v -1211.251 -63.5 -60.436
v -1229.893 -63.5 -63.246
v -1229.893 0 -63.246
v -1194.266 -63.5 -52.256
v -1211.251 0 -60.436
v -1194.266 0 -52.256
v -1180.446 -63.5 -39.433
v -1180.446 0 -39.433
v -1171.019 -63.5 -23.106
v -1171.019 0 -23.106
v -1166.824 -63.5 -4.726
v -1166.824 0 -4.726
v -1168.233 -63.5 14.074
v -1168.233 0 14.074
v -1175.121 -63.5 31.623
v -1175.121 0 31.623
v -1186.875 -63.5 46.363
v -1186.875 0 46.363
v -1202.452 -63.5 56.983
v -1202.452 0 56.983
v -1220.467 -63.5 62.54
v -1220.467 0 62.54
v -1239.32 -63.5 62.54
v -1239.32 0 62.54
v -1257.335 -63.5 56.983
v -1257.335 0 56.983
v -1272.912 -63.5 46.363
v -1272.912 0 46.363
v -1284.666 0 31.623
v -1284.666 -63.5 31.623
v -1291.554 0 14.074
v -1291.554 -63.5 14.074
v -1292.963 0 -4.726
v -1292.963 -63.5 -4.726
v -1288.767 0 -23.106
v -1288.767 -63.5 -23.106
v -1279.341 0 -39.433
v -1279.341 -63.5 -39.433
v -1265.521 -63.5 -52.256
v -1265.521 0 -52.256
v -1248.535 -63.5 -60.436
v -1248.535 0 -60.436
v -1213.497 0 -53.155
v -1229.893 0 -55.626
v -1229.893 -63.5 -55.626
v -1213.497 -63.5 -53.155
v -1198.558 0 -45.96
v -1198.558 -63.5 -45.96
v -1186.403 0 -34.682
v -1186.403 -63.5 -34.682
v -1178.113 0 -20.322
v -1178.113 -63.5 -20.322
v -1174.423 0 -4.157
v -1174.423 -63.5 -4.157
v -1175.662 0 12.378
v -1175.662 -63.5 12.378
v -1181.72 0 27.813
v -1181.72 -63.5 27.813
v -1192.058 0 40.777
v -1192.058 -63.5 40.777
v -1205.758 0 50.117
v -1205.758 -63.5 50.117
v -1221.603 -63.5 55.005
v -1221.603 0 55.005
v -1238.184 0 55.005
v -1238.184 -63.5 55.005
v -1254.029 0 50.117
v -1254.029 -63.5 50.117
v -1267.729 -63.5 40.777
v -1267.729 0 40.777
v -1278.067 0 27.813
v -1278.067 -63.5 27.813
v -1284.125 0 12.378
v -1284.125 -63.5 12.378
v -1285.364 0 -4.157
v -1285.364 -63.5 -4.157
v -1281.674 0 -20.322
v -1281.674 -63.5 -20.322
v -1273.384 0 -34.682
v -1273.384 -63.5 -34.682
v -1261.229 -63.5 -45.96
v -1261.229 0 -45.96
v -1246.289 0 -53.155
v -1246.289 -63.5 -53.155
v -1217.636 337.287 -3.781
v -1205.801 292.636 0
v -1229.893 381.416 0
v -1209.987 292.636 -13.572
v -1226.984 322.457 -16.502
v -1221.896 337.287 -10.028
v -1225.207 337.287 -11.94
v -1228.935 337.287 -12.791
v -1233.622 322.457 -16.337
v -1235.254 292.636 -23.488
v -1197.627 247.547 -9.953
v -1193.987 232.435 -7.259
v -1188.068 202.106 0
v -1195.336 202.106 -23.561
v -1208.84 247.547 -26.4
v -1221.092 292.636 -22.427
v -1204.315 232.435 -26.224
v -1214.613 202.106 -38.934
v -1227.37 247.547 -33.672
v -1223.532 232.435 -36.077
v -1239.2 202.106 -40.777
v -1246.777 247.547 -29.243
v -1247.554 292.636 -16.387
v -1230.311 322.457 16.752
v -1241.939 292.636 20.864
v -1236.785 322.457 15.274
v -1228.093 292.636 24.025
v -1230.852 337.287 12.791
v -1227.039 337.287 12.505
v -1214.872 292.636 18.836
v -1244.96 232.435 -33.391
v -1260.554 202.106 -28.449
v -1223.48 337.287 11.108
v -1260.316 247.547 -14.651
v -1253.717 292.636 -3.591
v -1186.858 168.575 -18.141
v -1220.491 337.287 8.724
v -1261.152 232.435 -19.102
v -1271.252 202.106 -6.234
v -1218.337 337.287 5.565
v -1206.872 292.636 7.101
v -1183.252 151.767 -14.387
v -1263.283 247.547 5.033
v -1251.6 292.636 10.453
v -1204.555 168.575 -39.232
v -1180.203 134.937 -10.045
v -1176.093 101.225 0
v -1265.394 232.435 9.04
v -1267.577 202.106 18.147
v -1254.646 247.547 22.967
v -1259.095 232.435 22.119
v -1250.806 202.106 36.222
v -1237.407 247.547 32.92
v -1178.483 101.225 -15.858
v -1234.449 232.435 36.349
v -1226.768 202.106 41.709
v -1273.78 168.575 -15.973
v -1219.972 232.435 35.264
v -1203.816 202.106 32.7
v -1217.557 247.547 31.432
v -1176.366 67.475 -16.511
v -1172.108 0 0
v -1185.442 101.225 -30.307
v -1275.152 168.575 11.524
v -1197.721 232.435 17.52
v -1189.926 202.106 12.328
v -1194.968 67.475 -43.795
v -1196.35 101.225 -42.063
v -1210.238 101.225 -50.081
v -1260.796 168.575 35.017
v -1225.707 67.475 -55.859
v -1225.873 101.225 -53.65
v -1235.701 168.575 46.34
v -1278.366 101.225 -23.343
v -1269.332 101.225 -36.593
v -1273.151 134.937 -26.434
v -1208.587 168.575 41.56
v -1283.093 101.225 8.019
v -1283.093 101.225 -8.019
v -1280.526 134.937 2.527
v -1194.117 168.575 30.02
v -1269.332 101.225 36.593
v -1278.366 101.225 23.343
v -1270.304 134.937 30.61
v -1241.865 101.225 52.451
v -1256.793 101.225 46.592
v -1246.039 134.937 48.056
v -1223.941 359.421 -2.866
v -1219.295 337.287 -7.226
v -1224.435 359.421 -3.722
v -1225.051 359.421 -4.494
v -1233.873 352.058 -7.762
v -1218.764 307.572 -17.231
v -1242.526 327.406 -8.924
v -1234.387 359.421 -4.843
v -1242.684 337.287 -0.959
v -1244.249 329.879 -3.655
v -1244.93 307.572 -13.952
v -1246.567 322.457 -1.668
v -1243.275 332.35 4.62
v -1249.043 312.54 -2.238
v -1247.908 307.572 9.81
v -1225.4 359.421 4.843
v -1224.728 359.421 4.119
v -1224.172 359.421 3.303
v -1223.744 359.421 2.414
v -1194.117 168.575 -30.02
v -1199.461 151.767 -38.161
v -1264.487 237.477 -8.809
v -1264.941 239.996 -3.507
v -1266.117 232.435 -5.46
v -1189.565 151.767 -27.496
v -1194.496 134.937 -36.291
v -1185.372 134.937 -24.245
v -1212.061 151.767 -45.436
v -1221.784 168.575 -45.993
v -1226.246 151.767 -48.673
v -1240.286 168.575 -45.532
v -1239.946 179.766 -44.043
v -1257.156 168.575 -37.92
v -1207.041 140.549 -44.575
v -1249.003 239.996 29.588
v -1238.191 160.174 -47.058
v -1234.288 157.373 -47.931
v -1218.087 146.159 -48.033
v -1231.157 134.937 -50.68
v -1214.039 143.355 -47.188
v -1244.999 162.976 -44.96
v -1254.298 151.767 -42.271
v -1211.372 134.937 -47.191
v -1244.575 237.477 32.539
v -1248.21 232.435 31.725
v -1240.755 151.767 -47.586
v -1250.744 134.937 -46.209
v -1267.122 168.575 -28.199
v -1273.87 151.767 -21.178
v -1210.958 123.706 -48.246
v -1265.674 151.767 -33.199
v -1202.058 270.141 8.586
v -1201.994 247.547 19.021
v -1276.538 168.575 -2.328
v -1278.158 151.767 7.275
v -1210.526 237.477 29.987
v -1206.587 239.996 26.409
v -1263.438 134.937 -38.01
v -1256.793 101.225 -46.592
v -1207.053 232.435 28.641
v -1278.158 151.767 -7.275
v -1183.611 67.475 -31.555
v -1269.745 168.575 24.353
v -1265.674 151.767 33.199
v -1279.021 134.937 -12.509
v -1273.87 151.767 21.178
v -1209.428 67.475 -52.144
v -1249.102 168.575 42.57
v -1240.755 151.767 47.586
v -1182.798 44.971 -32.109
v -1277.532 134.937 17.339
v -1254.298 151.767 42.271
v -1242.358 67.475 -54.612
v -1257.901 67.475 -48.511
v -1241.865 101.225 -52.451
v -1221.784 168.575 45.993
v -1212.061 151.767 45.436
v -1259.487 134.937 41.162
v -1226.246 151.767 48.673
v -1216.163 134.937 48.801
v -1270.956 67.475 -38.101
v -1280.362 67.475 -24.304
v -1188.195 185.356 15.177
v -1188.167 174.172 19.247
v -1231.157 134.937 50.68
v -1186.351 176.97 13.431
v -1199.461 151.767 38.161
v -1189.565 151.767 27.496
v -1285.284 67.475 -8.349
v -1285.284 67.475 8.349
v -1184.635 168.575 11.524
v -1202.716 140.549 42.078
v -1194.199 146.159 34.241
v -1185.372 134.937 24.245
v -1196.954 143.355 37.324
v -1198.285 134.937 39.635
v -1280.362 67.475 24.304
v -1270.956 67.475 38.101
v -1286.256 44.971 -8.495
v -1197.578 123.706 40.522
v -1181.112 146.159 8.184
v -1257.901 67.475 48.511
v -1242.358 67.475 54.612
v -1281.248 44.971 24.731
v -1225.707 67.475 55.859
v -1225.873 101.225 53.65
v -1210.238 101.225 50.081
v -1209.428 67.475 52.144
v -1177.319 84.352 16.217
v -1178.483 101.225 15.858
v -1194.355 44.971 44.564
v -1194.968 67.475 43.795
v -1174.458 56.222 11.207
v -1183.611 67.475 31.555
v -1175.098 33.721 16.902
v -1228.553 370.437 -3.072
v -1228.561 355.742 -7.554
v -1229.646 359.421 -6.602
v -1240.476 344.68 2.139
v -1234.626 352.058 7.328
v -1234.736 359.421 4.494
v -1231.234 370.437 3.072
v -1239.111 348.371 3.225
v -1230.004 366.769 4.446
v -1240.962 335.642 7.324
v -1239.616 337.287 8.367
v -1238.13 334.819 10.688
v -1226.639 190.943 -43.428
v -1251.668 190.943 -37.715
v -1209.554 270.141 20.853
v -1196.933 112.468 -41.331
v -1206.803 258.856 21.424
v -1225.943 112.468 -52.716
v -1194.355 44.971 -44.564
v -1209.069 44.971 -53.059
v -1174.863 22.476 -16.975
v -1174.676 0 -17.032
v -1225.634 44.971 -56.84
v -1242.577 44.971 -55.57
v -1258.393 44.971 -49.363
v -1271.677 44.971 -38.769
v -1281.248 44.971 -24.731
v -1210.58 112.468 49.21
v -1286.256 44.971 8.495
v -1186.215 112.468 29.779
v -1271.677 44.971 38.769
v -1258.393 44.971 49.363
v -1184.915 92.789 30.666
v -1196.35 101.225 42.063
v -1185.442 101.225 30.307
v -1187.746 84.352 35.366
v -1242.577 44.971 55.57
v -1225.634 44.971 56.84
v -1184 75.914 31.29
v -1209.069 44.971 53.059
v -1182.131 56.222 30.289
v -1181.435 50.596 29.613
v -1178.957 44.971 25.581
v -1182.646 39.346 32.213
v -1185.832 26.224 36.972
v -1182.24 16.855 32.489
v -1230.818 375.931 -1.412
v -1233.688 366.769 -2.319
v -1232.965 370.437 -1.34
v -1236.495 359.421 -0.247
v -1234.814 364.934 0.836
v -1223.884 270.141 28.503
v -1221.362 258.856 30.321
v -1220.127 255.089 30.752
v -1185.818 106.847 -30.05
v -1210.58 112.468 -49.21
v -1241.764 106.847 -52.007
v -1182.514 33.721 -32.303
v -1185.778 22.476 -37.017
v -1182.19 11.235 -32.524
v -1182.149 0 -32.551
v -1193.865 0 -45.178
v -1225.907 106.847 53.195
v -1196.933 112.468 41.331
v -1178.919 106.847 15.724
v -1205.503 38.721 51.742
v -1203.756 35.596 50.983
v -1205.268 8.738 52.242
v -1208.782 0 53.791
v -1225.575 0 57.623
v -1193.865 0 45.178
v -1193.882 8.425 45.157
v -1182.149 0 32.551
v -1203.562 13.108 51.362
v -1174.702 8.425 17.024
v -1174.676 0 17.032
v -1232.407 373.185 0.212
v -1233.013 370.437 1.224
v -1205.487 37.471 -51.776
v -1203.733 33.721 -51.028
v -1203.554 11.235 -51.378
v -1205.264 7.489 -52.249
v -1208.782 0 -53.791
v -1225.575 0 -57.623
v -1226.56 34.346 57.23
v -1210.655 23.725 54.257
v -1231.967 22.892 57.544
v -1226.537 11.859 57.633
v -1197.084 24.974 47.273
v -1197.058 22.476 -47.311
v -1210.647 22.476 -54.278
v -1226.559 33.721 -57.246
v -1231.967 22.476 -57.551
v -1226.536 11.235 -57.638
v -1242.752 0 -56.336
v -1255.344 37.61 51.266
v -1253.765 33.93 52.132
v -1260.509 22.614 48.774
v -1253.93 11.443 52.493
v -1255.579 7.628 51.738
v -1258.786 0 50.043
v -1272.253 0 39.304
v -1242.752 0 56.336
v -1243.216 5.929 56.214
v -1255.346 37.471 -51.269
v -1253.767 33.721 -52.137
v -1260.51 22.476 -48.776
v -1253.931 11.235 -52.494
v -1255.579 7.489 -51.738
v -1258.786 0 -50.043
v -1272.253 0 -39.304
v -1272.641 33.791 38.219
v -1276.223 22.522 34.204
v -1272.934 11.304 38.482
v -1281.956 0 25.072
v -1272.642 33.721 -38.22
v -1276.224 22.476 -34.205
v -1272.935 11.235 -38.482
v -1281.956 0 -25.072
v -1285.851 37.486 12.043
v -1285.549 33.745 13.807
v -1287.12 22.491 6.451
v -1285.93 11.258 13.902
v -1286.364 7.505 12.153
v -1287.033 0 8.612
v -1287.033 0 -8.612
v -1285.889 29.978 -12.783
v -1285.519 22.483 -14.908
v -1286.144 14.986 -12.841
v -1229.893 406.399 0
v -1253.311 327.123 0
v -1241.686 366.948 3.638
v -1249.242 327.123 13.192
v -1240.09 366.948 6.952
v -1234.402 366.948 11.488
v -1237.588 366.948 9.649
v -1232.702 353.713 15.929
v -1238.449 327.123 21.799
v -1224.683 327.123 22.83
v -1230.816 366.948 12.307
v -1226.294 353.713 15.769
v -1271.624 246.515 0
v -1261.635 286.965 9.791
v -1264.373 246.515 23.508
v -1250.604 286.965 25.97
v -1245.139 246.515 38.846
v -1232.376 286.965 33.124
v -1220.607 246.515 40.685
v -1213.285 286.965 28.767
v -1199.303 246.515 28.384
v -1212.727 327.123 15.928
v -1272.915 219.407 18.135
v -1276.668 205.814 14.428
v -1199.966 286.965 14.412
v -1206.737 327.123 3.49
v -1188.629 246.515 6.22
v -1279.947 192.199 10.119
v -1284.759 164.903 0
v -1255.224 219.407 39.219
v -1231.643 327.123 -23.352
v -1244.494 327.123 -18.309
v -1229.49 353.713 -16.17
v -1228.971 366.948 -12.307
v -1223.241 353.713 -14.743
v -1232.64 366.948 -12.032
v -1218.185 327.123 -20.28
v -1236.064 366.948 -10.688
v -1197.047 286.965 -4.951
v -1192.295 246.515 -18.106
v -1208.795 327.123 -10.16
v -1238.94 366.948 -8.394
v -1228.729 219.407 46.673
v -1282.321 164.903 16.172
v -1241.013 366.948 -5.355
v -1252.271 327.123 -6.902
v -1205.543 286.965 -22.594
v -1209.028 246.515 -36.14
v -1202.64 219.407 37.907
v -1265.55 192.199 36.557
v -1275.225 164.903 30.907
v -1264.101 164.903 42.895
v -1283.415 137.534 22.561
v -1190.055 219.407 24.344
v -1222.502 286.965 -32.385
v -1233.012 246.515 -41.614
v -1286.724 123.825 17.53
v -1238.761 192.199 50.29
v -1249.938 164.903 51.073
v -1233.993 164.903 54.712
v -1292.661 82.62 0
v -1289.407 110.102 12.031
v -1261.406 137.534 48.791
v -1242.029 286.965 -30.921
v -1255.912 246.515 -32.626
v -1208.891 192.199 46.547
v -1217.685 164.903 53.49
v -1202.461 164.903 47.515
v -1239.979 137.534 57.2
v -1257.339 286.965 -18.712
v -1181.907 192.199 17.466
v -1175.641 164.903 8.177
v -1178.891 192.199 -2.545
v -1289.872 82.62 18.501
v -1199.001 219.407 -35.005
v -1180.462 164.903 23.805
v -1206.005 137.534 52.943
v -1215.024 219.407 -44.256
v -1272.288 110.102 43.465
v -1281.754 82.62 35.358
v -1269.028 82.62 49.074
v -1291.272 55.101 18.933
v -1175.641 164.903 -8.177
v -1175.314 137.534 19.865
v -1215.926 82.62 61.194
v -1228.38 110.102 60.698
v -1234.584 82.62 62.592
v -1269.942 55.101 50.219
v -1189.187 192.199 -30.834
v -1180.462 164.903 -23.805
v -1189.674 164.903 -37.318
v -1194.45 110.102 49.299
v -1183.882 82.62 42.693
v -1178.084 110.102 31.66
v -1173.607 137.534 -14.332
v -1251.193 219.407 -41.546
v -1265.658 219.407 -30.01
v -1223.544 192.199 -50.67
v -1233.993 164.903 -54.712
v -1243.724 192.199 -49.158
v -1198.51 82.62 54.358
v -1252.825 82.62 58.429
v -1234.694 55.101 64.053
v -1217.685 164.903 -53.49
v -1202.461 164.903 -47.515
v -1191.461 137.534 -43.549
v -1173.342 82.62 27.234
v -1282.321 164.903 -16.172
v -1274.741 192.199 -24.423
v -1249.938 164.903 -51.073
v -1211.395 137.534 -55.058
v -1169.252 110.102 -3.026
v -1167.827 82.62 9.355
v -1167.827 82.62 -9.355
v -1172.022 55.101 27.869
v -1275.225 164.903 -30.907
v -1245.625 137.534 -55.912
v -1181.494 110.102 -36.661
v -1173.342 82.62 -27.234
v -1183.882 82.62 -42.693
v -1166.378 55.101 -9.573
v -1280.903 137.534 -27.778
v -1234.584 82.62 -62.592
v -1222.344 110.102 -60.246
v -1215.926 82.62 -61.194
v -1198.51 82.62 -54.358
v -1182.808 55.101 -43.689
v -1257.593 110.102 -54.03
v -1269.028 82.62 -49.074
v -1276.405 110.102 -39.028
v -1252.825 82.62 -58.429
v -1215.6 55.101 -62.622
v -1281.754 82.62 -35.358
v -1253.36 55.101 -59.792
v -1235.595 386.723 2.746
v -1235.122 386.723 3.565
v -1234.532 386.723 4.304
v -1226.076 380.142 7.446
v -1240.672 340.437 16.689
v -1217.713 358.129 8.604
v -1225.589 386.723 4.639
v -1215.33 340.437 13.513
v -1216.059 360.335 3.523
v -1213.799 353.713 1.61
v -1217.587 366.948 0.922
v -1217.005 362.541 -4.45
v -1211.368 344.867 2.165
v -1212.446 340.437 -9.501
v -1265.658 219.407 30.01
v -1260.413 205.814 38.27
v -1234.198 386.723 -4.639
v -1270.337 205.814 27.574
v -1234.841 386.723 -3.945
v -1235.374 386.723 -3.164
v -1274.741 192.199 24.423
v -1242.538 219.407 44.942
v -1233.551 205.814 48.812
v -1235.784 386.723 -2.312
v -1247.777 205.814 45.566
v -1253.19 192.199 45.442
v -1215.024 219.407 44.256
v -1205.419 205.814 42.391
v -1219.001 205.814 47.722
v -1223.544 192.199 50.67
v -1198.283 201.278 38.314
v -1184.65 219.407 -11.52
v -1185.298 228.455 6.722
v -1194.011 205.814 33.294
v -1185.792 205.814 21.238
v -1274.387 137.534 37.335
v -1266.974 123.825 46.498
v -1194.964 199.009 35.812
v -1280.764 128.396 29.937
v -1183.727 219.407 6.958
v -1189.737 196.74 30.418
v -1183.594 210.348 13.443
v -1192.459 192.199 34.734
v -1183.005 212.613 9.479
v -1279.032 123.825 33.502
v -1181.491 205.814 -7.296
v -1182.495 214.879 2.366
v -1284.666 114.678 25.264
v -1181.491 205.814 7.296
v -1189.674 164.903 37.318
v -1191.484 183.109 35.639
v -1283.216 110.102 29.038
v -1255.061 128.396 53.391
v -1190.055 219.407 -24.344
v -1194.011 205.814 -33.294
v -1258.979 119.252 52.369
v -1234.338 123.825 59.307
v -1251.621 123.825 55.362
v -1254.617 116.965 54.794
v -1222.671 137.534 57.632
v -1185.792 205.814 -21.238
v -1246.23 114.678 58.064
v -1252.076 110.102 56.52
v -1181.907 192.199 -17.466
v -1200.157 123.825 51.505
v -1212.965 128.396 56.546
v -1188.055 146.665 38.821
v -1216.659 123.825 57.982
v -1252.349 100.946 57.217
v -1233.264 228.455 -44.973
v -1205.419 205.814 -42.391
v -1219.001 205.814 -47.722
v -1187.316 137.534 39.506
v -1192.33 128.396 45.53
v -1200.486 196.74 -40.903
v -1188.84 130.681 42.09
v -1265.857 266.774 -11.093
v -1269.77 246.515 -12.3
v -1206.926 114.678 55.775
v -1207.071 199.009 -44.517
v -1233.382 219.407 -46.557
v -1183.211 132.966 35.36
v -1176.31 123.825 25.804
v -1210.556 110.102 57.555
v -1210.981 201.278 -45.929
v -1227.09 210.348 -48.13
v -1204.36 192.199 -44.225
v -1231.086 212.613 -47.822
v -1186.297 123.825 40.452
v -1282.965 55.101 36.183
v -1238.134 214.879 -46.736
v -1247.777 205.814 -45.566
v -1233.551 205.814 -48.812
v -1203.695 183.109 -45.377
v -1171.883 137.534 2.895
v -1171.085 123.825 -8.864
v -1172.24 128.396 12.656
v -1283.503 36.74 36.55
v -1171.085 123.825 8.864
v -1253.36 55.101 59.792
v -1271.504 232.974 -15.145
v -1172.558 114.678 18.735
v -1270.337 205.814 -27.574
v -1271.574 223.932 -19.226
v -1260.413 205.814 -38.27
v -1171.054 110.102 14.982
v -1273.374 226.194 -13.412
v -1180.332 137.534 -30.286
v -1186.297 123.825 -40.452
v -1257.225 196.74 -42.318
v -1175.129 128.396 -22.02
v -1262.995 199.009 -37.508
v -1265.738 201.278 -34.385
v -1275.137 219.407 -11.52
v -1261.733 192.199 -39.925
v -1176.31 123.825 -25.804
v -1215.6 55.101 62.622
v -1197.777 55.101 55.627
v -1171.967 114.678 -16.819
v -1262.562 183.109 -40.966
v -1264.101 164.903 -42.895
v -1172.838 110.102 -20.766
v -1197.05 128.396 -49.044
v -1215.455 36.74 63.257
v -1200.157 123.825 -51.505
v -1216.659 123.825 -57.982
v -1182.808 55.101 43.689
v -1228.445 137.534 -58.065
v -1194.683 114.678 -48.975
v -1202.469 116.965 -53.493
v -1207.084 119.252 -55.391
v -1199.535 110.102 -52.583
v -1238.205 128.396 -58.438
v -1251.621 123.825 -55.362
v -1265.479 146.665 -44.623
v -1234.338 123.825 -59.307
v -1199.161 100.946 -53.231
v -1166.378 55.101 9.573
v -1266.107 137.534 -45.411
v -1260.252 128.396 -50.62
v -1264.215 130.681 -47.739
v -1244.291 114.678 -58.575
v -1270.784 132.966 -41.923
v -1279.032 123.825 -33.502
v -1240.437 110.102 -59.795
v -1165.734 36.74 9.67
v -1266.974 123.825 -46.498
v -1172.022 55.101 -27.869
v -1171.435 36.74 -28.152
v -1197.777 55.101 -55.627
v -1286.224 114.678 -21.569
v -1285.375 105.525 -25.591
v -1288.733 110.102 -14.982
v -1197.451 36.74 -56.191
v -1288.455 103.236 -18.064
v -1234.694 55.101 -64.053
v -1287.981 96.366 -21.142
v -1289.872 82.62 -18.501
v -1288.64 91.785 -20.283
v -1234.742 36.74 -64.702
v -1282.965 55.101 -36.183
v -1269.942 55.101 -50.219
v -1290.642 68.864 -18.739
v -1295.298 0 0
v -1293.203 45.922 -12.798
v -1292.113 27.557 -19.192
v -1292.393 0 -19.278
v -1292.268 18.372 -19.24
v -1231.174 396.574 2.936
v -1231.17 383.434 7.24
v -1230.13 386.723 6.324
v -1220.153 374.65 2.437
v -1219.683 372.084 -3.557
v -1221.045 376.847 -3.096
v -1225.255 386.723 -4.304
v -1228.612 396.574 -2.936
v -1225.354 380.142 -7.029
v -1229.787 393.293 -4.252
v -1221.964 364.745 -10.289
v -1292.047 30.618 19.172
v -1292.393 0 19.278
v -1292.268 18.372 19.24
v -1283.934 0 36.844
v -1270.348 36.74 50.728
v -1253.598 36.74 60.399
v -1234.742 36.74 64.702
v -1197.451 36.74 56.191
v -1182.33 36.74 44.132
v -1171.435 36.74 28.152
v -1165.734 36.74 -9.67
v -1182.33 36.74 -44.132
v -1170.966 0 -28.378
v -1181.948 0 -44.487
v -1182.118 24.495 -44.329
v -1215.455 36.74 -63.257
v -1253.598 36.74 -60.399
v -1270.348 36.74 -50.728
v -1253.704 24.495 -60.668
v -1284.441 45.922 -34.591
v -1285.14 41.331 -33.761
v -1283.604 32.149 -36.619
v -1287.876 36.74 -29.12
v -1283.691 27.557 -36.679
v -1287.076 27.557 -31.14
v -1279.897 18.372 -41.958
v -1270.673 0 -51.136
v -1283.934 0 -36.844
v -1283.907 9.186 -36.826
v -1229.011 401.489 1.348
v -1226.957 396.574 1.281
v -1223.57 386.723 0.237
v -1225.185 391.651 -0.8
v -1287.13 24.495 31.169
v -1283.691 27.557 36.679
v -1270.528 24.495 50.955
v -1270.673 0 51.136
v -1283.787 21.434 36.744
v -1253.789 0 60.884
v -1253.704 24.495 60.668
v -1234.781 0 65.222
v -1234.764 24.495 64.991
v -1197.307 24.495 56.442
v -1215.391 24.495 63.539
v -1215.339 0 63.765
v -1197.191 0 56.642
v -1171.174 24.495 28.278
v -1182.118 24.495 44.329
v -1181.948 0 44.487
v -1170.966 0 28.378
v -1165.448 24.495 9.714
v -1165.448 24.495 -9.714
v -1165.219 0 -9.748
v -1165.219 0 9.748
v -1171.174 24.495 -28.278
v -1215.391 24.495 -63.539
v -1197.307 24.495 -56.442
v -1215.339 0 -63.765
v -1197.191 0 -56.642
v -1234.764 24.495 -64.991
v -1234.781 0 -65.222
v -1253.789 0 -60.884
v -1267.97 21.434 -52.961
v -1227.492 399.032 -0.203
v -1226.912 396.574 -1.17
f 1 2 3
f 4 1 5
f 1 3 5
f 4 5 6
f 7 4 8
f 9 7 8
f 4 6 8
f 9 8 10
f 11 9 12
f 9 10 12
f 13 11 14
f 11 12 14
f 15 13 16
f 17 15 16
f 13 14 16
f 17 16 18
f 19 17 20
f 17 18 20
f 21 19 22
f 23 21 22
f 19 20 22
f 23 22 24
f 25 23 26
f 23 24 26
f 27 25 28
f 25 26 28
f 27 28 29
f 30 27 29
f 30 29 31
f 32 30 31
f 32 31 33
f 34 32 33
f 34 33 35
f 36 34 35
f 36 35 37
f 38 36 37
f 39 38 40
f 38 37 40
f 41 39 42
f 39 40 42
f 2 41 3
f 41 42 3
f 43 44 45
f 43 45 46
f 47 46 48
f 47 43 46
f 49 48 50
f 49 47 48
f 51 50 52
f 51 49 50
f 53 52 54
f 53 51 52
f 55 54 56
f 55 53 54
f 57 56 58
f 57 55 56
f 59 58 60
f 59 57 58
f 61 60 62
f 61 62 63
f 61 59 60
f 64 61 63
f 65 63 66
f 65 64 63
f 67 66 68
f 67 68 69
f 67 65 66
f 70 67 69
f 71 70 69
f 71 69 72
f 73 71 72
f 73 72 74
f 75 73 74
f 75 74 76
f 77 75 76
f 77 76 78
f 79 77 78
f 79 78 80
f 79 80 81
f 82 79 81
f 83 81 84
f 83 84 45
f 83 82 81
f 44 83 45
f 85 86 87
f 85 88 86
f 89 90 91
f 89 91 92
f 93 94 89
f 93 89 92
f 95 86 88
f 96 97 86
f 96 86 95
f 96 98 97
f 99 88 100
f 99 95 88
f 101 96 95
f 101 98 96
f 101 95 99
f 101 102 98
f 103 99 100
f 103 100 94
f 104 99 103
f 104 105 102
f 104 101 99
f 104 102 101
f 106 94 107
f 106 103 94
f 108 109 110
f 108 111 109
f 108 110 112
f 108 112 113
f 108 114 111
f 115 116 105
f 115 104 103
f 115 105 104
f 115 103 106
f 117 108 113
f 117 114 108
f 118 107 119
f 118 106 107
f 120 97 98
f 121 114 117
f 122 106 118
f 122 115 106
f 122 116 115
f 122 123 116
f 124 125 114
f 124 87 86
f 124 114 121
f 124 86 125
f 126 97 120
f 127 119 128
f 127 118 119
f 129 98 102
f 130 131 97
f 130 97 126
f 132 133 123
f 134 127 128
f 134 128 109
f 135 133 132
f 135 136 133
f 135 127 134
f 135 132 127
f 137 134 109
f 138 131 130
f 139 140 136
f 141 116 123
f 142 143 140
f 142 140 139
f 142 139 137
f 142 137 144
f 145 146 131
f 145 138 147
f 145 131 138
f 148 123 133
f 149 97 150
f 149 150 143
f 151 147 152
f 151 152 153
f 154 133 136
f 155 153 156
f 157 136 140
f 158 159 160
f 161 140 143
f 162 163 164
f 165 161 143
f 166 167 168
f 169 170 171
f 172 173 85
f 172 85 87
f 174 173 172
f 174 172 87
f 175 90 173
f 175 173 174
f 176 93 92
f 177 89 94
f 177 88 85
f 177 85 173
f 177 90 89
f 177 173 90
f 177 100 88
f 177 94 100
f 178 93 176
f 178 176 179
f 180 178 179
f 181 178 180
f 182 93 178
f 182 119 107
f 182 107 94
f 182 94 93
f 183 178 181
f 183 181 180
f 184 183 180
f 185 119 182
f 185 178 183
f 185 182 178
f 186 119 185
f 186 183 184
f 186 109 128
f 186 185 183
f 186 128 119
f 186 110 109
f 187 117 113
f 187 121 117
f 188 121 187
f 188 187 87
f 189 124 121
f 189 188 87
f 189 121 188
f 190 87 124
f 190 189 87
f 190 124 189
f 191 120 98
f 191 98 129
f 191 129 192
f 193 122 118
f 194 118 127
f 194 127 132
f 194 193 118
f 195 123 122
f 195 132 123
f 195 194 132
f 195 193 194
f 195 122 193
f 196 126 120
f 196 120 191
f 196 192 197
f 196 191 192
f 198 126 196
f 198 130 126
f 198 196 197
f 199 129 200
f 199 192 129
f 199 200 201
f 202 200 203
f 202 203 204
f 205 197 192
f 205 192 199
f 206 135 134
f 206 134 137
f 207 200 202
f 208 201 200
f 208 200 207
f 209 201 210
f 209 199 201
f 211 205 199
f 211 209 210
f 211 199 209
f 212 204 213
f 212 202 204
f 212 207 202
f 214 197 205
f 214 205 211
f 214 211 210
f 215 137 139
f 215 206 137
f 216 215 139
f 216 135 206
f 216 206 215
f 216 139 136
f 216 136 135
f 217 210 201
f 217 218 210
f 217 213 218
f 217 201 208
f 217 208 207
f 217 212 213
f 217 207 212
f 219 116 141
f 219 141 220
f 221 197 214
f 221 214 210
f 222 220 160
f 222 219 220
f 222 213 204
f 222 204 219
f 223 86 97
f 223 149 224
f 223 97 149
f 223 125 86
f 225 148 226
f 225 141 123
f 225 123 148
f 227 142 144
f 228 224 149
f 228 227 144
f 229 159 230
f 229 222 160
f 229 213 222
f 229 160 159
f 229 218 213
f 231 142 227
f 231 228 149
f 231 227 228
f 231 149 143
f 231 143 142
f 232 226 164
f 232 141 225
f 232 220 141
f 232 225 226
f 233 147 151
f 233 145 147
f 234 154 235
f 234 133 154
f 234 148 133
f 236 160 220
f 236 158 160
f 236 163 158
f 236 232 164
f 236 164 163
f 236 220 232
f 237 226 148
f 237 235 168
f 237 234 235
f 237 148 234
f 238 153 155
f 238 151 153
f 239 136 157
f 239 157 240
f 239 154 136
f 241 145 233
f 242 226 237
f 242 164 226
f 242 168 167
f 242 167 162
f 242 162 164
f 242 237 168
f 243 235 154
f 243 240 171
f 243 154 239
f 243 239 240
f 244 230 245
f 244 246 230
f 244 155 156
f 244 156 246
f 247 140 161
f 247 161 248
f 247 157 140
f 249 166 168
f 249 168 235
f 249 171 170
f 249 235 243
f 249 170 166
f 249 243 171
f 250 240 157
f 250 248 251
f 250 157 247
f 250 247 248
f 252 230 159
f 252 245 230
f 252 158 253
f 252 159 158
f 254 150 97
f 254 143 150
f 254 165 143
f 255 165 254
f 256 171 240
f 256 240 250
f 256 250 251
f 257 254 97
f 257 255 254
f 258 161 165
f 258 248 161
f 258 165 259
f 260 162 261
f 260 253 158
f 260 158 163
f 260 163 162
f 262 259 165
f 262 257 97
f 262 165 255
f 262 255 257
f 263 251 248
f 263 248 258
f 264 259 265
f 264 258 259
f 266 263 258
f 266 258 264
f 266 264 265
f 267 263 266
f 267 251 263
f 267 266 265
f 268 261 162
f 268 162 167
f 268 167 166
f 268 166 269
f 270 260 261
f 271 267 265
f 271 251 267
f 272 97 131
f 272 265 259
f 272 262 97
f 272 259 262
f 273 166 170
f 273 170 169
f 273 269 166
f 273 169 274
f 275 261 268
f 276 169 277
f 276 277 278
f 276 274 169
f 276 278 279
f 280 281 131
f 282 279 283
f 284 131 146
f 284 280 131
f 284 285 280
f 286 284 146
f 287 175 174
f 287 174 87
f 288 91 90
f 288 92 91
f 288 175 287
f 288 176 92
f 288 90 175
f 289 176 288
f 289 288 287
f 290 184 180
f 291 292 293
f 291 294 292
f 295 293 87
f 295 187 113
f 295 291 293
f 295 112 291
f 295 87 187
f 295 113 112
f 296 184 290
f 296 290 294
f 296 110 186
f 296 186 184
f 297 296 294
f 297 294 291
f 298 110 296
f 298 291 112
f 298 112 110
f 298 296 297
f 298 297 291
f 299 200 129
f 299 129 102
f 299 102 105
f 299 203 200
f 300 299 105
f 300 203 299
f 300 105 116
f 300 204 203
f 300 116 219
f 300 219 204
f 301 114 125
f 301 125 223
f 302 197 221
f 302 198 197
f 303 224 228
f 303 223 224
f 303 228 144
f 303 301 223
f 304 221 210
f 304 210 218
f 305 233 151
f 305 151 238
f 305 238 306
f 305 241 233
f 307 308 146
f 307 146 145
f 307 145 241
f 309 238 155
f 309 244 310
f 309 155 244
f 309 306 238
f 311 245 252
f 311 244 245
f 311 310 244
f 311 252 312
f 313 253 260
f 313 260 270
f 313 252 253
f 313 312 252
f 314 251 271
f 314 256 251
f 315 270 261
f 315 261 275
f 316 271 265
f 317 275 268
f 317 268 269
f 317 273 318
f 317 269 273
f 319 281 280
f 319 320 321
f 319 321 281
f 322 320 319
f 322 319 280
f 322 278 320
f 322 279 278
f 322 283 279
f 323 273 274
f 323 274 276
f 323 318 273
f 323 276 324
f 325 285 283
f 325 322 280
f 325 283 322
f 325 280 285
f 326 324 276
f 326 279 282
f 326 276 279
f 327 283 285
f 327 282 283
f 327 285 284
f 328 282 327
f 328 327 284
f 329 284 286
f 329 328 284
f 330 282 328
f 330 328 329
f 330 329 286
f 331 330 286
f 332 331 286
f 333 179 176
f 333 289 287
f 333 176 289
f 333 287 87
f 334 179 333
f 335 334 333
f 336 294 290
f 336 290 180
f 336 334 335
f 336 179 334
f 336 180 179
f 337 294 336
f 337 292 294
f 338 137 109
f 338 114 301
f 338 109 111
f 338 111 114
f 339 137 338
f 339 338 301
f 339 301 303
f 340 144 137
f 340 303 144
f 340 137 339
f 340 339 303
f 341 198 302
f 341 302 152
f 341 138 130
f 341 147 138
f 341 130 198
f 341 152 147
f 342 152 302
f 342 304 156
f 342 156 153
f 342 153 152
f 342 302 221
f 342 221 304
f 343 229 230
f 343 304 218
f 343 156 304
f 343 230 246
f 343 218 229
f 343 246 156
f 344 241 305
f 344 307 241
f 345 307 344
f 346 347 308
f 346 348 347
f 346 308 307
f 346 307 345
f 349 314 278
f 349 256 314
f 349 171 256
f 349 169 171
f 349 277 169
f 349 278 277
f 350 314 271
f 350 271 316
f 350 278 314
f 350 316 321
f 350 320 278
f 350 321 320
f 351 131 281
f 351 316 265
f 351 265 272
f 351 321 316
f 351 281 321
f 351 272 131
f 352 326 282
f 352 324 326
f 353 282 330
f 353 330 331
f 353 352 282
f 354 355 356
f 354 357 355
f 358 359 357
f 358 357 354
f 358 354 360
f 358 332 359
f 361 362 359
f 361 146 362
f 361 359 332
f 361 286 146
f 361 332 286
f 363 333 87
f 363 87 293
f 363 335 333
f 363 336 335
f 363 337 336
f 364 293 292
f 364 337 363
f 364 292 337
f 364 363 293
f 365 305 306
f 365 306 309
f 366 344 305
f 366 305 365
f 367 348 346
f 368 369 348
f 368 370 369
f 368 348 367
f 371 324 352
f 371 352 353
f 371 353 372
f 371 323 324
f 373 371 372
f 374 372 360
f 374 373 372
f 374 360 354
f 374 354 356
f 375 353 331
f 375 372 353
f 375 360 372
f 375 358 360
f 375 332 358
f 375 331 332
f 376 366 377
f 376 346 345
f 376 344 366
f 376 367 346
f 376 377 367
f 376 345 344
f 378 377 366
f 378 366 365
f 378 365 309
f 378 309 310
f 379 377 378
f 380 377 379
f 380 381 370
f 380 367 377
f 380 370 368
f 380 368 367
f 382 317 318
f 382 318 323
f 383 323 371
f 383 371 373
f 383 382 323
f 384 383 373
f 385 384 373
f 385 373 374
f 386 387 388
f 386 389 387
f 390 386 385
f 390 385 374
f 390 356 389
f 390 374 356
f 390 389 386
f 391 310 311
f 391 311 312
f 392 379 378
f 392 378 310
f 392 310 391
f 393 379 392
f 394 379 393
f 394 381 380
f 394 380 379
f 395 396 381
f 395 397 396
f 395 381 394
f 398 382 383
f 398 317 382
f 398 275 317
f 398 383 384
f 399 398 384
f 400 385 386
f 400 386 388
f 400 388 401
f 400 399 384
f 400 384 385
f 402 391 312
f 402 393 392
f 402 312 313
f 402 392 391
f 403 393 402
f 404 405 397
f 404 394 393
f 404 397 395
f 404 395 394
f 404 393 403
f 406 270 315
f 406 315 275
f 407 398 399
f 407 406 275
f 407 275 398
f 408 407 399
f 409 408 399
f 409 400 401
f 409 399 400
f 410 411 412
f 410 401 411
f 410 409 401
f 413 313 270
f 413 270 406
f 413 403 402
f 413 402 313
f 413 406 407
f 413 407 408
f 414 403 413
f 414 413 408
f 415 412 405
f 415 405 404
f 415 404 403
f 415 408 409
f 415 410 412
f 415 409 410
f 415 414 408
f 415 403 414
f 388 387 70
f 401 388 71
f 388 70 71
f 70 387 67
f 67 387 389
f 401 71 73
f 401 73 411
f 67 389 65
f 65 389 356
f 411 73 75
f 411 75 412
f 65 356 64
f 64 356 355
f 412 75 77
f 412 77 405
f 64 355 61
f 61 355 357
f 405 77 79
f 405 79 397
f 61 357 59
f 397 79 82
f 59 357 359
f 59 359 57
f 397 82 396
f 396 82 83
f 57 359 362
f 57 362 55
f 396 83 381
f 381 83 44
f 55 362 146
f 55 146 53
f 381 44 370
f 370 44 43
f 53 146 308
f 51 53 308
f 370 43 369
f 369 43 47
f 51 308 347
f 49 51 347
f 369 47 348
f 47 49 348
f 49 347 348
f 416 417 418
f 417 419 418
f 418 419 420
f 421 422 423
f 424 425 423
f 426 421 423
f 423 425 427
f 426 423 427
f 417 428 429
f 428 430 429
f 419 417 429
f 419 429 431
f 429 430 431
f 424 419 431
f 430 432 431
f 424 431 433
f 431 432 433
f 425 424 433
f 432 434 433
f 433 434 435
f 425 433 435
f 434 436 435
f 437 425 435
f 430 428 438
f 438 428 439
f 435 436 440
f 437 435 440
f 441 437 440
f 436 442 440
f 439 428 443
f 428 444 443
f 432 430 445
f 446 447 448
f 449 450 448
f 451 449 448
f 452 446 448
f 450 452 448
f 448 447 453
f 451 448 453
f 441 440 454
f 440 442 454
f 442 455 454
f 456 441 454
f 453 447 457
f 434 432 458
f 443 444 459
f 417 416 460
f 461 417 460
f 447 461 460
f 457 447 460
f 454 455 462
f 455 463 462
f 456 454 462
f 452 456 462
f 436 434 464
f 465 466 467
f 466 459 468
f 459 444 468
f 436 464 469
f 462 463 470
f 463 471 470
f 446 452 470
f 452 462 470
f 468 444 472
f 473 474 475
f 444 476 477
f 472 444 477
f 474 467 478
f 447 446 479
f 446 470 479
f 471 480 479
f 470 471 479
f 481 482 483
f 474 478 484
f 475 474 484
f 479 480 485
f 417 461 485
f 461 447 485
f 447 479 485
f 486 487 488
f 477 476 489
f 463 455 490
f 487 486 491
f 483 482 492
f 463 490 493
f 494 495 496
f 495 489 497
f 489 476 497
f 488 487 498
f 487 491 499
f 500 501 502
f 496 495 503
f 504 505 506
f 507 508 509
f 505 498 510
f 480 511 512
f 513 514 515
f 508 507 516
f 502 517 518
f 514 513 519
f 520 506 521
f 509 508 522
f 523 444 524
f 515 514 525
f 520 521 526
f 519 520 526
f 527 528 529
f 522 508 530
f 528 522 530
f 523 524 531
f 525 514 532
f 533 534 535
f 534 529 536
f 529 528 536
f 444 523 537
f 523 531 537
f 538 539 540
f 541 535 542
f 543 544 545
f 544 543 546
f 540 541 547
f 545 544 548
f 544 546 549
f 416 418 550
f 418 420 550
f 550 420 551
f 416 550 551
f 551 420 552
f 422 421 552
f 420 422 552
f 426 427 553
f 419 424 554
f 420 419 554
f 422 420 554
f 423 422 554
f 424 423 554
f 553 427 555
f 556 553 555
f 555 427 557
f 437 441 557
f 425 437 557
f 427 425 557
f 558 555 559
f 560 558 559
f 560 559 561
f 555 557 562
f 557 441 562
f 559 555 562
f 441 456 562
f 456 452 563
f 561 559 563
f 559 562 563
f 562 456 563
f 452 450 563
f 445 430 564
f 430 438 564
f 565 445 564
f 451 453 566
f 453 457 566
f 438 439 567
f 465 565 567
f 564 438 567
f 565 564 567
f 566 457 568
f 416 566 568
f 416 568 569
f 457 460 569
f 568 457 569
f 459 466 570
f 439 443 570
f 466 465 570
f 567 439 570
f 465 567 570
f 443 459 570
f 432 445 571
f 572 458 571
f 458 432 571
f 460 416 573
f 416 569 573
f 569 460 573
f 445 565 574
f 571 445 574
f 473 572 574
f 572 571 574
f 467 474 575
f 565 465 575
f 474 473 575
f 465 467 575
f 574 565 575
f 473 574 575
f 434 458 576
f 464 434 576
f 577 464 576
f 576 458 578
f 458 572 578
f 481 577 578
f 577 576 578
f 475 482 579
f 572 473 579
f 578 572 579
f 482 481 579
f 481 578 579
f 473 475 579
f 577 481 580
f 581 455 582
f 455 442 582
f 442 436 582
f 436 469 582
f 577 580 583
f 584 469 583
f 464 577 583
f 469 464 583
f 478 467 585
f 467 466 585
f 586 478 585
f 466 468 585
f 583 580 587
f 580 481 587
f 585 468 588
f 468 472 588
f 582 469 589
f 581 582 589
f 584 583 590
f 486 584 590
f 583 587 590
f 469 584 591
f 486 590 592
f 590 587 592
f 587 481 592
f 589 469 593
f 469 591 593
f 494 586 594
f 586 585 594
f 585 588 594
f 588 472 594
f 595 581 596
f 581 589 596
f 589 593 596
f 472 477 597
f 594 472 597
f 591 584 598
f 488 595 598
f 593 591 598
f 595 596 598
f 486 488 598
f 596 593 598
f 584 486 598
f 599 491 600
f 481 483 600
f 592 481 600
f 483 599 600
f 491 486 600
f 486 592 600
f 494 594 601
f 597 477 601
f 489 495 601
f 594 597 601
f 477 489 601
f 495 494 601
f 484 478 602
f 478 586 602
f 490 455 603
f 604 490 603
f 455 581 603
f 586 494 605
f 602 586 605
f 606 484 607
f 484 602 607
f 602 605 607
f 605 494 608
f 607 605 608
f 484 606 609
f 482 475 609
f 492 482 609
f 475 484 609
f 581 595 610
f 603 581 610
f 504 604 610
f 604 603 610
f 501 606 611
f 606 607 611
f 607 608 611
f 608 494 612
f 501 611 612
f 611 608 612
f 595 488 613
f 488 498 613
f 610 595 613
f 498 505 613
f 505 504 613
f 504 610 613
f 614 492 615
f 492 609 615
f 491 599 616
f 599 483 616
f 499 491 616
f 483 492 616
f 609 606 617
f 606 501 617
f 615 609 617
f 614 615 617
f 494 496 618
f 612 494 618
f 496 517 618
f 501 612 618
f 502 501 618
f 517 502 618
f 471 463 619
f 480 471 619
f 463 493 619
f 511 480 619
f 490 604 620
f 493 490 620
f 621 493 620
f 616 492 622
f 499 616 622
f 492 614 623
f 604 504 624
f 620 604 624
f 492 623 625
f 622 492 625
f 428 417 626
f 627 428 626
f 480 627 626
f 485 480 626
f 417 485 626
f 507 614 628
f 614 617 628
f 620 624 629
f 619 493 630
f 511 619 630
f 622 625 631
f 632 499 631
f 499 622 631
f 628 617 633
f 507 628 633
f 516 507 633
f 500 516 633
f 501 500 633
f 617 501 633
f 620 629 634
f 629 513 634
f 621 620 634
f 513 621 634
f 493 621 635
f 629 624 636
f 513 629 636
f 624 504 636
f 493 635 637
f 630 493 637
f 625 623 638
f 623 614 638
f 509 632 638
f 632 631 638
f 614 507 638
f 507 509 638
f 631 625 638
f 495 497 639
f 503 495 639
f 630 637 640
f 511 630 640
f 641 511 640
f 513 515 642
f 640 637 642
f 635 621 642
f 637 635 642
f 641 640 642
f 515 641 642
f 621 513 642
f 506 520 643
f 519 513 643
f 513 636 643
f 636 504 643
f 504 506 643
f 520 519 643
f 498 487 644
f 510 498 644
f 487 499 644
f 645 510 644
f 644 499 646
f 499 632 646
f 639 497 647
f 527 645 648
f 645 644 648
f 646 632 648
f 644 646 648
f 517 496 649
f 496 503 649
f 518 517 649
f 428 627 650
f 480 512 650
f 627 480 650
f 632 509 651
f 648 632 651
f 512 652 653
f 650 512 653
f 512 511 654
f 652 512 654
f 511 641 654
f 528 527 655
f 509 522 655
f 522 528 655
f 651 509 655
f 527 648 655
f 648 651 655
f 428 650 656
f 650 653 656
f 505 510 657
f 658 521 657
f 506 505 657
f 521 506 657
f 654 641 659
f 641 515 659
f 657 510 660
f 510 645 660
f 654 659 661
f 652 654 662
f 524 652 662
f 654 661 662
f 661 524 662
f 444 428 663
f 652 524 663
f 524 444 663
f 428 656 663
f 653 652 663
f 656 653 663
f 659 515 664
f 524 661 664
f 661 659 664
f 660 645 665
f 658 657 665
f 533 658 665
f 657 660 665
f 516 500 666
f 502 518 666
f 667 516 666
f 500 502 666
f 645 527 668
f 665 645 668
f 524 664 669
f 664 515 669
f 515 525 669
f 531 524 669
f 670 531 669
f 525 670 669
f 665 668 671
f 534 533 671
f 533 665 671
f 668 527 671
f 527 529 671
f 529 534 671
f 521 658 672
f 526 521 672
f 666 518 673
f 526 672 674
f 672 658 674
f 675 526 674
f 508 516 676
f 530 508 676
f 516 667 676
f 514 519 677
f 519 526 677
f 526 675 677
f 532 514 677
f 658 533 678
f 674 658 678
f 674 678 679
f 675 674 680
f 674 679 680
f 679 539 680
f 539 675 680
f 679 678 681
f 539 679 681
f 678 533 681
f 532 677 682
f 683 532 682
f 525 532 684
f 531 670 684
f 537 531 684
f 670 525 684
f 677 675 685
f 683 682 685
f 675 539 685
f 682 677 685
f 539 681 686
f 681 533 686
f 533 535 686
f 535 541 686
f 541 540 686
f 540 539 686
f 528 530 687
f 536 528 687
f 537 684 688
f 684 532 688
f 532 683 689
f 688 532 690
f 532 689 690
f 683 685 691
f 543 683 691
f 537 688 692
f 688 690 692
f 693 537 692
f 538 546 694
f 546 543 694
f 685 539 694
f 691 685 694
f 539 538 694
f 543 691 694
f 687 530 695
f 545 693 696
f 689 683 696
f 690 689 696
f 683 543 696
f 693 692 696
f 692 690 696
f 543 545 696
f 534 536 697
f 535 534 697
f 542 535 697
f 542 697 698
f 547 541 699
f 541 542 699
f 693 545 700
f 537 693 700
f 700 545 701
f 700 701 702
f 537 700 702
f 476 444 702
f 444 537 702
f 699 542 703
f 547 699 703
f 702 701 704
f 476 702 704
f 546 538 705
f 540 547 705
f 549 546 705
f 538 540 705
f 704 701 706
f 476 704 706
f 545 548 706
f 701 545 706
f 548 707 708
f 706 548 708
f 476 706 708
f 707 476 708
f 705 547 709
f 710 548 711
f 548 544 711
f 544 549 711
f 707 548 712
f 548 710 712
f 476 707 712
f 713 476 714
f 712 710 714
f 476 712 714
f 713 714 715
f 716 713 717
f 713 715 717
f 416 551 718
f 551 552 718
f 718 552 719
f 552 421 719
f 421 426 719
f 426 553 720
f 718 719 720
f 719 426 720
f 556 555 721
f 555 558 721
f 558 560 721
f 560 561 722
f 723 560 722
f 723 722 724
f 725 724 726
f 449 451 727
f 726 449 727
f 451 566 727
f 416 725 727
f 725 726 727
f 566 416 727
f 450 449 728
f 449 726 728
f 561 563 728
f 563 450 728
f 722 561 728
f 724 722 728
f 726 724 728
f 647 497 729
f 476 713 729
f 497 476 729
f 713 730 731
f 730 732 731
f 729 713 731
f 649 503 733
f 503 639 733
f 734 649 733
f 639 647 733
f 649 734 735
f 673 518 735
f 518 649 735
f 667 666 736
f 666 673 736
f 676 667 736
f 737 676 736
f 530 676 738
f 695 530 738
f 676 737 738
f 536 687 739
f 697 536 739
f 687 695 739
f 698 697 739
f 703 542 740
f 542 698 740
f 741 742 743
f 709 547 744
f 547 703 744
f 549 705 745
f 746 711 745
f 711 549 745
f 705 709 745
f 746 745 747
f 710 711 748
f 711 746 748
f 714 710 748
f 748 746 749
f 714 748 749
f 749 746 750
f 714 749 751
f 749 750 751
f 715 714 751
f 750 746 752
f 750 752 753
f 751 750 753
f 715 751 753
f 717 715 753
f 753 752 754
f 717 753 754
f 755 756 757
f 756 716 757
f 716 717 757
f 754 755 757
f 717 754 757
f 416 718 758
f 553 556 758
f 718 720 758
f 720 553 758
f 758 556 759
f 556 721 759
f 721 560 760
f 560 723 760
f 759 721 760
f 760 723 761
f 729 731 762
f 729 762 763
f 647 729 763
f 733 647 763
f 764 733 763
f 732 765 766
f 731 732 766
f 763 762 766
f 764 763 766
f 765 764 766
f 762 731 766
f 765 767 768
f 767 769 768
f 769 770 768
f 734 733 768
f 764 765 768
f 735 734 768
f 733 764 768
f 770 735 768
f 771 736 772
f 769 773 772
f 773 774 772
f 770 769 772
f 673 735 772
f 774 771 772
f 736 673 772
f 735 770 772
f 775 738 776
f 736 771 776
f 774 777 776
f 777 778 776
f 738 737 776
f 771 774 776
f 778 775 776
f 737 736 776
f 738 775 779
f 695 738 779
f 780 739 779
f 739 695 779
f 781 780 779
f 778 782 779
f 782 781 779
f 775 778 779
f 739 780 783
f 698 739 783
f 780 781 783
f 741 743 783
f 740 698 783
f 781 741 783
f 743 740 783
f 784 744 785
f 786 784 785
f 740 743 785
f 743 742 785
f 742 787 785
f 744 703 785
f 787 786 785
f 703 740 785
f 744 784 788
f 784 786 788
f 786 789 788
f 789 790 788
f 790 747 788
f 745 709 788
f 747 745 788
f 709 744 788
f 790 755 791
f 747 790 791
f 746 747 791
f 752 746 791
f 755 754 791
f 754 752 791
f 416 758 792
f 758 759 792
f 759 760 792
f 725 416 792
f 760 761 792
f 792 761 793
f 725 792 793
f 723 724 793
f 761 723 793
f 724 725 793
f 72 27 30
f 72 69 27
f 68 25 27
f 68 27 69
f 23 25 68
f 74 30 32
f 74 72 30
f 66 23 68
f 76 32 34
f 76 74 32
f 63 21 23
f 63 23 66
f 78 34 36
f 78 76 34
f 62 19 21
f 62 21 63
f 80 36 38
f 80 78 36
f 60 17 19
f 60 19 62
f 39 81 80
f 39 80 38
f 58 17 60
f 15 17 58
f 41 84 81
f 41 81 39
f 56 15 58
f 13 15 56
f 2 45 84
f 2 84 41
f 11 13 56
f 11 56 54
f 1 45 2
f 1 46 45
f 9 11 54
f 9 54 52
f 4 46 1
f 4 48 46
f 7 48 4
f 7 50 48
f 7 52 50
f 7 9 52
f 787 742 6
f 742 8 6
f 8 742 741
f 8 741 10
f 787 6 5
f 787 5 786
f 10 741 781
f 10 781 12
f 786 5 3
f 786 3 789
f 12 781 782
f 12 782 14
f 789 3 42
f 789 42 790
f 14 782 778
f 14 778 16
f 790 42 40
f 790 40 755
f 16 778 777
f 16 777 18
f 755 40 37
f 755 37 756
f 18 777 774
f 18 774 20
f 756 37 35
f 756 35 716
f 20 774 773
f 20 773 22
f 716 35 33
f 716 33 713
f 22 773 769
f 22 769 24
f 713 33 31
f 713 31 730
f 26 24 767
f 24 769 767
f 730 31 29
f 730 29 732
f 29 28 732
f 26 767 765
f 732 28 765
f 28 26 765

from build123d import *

# Parameters (mm, degrees)
SKETCH3_R           = 63.246
SKETCH3_R_2         = 55.626
BOSS_EXTRUDE1_DEPTH = 63.5


# Read off the part's stored shape, not the designer's step: Shell1
with BuildPart() as part:
    # Sketch2 → Revolve1 (revolve)
    with BuildSketch(Plane.XY):
        with BuildLine():
            Line((-1295.2984, 0), (-1229.8934, 0))
            Line((-1229.8934, 0), (-1229.8934, 406.399027655))
            ThreePointArc((-1229.8934, 406.399027655), (-1278.842620934, 205.814226734), (-1295.2984, 0))
        make_face()
    revolve(axis=Axis((-1229.8934, 0, 0), (0, 1, 0)))

    # Shell1 outline → Shell1 (revolve, cut)
    with BuildSketch(Plane(origin=(-1229.8934, 0, 0), x_dir=(1, 0, 0), z_dir=(0, 0, 1))):
        with BuildLine():
            add(Edge.make_bspline(
                [(0, 381.415634791), (57.785, 195.085071394), (57.785, 0)],
                knots=[5.982469351, 5.982469351, 5.982469351, 6.283185307, 6.283185307, 6.283185307], degree=2, weights=[1, 0.988717519, 1]))
            Line((0, 381.415634791), (0, -1e-07))
            Line((0, -1e-07), (57.785, 0))
        make_face()
    revolve(axis=Axis((-1229.8934, 0, 0), (0, 1, 0)), mode=Mode.SUBTRACT)

    # Sketch3 → Boss-Extrude1 (add)
    with BuildSketch(Plane.XZ):
        with Locations(Location((-1229.8934, 0, 0), (0, 0, 270))):
            Circle(SKETCH3_R)
        with Locations(Location((-1229.8934, 0, 0), (0, 0, 270))):
            Circle(SKETCH3_R_2, mode=Mode.SUBTRACT)
    extrude(amount=BOSS_EXTRUDE1_DEPTH)


solid = part.part
